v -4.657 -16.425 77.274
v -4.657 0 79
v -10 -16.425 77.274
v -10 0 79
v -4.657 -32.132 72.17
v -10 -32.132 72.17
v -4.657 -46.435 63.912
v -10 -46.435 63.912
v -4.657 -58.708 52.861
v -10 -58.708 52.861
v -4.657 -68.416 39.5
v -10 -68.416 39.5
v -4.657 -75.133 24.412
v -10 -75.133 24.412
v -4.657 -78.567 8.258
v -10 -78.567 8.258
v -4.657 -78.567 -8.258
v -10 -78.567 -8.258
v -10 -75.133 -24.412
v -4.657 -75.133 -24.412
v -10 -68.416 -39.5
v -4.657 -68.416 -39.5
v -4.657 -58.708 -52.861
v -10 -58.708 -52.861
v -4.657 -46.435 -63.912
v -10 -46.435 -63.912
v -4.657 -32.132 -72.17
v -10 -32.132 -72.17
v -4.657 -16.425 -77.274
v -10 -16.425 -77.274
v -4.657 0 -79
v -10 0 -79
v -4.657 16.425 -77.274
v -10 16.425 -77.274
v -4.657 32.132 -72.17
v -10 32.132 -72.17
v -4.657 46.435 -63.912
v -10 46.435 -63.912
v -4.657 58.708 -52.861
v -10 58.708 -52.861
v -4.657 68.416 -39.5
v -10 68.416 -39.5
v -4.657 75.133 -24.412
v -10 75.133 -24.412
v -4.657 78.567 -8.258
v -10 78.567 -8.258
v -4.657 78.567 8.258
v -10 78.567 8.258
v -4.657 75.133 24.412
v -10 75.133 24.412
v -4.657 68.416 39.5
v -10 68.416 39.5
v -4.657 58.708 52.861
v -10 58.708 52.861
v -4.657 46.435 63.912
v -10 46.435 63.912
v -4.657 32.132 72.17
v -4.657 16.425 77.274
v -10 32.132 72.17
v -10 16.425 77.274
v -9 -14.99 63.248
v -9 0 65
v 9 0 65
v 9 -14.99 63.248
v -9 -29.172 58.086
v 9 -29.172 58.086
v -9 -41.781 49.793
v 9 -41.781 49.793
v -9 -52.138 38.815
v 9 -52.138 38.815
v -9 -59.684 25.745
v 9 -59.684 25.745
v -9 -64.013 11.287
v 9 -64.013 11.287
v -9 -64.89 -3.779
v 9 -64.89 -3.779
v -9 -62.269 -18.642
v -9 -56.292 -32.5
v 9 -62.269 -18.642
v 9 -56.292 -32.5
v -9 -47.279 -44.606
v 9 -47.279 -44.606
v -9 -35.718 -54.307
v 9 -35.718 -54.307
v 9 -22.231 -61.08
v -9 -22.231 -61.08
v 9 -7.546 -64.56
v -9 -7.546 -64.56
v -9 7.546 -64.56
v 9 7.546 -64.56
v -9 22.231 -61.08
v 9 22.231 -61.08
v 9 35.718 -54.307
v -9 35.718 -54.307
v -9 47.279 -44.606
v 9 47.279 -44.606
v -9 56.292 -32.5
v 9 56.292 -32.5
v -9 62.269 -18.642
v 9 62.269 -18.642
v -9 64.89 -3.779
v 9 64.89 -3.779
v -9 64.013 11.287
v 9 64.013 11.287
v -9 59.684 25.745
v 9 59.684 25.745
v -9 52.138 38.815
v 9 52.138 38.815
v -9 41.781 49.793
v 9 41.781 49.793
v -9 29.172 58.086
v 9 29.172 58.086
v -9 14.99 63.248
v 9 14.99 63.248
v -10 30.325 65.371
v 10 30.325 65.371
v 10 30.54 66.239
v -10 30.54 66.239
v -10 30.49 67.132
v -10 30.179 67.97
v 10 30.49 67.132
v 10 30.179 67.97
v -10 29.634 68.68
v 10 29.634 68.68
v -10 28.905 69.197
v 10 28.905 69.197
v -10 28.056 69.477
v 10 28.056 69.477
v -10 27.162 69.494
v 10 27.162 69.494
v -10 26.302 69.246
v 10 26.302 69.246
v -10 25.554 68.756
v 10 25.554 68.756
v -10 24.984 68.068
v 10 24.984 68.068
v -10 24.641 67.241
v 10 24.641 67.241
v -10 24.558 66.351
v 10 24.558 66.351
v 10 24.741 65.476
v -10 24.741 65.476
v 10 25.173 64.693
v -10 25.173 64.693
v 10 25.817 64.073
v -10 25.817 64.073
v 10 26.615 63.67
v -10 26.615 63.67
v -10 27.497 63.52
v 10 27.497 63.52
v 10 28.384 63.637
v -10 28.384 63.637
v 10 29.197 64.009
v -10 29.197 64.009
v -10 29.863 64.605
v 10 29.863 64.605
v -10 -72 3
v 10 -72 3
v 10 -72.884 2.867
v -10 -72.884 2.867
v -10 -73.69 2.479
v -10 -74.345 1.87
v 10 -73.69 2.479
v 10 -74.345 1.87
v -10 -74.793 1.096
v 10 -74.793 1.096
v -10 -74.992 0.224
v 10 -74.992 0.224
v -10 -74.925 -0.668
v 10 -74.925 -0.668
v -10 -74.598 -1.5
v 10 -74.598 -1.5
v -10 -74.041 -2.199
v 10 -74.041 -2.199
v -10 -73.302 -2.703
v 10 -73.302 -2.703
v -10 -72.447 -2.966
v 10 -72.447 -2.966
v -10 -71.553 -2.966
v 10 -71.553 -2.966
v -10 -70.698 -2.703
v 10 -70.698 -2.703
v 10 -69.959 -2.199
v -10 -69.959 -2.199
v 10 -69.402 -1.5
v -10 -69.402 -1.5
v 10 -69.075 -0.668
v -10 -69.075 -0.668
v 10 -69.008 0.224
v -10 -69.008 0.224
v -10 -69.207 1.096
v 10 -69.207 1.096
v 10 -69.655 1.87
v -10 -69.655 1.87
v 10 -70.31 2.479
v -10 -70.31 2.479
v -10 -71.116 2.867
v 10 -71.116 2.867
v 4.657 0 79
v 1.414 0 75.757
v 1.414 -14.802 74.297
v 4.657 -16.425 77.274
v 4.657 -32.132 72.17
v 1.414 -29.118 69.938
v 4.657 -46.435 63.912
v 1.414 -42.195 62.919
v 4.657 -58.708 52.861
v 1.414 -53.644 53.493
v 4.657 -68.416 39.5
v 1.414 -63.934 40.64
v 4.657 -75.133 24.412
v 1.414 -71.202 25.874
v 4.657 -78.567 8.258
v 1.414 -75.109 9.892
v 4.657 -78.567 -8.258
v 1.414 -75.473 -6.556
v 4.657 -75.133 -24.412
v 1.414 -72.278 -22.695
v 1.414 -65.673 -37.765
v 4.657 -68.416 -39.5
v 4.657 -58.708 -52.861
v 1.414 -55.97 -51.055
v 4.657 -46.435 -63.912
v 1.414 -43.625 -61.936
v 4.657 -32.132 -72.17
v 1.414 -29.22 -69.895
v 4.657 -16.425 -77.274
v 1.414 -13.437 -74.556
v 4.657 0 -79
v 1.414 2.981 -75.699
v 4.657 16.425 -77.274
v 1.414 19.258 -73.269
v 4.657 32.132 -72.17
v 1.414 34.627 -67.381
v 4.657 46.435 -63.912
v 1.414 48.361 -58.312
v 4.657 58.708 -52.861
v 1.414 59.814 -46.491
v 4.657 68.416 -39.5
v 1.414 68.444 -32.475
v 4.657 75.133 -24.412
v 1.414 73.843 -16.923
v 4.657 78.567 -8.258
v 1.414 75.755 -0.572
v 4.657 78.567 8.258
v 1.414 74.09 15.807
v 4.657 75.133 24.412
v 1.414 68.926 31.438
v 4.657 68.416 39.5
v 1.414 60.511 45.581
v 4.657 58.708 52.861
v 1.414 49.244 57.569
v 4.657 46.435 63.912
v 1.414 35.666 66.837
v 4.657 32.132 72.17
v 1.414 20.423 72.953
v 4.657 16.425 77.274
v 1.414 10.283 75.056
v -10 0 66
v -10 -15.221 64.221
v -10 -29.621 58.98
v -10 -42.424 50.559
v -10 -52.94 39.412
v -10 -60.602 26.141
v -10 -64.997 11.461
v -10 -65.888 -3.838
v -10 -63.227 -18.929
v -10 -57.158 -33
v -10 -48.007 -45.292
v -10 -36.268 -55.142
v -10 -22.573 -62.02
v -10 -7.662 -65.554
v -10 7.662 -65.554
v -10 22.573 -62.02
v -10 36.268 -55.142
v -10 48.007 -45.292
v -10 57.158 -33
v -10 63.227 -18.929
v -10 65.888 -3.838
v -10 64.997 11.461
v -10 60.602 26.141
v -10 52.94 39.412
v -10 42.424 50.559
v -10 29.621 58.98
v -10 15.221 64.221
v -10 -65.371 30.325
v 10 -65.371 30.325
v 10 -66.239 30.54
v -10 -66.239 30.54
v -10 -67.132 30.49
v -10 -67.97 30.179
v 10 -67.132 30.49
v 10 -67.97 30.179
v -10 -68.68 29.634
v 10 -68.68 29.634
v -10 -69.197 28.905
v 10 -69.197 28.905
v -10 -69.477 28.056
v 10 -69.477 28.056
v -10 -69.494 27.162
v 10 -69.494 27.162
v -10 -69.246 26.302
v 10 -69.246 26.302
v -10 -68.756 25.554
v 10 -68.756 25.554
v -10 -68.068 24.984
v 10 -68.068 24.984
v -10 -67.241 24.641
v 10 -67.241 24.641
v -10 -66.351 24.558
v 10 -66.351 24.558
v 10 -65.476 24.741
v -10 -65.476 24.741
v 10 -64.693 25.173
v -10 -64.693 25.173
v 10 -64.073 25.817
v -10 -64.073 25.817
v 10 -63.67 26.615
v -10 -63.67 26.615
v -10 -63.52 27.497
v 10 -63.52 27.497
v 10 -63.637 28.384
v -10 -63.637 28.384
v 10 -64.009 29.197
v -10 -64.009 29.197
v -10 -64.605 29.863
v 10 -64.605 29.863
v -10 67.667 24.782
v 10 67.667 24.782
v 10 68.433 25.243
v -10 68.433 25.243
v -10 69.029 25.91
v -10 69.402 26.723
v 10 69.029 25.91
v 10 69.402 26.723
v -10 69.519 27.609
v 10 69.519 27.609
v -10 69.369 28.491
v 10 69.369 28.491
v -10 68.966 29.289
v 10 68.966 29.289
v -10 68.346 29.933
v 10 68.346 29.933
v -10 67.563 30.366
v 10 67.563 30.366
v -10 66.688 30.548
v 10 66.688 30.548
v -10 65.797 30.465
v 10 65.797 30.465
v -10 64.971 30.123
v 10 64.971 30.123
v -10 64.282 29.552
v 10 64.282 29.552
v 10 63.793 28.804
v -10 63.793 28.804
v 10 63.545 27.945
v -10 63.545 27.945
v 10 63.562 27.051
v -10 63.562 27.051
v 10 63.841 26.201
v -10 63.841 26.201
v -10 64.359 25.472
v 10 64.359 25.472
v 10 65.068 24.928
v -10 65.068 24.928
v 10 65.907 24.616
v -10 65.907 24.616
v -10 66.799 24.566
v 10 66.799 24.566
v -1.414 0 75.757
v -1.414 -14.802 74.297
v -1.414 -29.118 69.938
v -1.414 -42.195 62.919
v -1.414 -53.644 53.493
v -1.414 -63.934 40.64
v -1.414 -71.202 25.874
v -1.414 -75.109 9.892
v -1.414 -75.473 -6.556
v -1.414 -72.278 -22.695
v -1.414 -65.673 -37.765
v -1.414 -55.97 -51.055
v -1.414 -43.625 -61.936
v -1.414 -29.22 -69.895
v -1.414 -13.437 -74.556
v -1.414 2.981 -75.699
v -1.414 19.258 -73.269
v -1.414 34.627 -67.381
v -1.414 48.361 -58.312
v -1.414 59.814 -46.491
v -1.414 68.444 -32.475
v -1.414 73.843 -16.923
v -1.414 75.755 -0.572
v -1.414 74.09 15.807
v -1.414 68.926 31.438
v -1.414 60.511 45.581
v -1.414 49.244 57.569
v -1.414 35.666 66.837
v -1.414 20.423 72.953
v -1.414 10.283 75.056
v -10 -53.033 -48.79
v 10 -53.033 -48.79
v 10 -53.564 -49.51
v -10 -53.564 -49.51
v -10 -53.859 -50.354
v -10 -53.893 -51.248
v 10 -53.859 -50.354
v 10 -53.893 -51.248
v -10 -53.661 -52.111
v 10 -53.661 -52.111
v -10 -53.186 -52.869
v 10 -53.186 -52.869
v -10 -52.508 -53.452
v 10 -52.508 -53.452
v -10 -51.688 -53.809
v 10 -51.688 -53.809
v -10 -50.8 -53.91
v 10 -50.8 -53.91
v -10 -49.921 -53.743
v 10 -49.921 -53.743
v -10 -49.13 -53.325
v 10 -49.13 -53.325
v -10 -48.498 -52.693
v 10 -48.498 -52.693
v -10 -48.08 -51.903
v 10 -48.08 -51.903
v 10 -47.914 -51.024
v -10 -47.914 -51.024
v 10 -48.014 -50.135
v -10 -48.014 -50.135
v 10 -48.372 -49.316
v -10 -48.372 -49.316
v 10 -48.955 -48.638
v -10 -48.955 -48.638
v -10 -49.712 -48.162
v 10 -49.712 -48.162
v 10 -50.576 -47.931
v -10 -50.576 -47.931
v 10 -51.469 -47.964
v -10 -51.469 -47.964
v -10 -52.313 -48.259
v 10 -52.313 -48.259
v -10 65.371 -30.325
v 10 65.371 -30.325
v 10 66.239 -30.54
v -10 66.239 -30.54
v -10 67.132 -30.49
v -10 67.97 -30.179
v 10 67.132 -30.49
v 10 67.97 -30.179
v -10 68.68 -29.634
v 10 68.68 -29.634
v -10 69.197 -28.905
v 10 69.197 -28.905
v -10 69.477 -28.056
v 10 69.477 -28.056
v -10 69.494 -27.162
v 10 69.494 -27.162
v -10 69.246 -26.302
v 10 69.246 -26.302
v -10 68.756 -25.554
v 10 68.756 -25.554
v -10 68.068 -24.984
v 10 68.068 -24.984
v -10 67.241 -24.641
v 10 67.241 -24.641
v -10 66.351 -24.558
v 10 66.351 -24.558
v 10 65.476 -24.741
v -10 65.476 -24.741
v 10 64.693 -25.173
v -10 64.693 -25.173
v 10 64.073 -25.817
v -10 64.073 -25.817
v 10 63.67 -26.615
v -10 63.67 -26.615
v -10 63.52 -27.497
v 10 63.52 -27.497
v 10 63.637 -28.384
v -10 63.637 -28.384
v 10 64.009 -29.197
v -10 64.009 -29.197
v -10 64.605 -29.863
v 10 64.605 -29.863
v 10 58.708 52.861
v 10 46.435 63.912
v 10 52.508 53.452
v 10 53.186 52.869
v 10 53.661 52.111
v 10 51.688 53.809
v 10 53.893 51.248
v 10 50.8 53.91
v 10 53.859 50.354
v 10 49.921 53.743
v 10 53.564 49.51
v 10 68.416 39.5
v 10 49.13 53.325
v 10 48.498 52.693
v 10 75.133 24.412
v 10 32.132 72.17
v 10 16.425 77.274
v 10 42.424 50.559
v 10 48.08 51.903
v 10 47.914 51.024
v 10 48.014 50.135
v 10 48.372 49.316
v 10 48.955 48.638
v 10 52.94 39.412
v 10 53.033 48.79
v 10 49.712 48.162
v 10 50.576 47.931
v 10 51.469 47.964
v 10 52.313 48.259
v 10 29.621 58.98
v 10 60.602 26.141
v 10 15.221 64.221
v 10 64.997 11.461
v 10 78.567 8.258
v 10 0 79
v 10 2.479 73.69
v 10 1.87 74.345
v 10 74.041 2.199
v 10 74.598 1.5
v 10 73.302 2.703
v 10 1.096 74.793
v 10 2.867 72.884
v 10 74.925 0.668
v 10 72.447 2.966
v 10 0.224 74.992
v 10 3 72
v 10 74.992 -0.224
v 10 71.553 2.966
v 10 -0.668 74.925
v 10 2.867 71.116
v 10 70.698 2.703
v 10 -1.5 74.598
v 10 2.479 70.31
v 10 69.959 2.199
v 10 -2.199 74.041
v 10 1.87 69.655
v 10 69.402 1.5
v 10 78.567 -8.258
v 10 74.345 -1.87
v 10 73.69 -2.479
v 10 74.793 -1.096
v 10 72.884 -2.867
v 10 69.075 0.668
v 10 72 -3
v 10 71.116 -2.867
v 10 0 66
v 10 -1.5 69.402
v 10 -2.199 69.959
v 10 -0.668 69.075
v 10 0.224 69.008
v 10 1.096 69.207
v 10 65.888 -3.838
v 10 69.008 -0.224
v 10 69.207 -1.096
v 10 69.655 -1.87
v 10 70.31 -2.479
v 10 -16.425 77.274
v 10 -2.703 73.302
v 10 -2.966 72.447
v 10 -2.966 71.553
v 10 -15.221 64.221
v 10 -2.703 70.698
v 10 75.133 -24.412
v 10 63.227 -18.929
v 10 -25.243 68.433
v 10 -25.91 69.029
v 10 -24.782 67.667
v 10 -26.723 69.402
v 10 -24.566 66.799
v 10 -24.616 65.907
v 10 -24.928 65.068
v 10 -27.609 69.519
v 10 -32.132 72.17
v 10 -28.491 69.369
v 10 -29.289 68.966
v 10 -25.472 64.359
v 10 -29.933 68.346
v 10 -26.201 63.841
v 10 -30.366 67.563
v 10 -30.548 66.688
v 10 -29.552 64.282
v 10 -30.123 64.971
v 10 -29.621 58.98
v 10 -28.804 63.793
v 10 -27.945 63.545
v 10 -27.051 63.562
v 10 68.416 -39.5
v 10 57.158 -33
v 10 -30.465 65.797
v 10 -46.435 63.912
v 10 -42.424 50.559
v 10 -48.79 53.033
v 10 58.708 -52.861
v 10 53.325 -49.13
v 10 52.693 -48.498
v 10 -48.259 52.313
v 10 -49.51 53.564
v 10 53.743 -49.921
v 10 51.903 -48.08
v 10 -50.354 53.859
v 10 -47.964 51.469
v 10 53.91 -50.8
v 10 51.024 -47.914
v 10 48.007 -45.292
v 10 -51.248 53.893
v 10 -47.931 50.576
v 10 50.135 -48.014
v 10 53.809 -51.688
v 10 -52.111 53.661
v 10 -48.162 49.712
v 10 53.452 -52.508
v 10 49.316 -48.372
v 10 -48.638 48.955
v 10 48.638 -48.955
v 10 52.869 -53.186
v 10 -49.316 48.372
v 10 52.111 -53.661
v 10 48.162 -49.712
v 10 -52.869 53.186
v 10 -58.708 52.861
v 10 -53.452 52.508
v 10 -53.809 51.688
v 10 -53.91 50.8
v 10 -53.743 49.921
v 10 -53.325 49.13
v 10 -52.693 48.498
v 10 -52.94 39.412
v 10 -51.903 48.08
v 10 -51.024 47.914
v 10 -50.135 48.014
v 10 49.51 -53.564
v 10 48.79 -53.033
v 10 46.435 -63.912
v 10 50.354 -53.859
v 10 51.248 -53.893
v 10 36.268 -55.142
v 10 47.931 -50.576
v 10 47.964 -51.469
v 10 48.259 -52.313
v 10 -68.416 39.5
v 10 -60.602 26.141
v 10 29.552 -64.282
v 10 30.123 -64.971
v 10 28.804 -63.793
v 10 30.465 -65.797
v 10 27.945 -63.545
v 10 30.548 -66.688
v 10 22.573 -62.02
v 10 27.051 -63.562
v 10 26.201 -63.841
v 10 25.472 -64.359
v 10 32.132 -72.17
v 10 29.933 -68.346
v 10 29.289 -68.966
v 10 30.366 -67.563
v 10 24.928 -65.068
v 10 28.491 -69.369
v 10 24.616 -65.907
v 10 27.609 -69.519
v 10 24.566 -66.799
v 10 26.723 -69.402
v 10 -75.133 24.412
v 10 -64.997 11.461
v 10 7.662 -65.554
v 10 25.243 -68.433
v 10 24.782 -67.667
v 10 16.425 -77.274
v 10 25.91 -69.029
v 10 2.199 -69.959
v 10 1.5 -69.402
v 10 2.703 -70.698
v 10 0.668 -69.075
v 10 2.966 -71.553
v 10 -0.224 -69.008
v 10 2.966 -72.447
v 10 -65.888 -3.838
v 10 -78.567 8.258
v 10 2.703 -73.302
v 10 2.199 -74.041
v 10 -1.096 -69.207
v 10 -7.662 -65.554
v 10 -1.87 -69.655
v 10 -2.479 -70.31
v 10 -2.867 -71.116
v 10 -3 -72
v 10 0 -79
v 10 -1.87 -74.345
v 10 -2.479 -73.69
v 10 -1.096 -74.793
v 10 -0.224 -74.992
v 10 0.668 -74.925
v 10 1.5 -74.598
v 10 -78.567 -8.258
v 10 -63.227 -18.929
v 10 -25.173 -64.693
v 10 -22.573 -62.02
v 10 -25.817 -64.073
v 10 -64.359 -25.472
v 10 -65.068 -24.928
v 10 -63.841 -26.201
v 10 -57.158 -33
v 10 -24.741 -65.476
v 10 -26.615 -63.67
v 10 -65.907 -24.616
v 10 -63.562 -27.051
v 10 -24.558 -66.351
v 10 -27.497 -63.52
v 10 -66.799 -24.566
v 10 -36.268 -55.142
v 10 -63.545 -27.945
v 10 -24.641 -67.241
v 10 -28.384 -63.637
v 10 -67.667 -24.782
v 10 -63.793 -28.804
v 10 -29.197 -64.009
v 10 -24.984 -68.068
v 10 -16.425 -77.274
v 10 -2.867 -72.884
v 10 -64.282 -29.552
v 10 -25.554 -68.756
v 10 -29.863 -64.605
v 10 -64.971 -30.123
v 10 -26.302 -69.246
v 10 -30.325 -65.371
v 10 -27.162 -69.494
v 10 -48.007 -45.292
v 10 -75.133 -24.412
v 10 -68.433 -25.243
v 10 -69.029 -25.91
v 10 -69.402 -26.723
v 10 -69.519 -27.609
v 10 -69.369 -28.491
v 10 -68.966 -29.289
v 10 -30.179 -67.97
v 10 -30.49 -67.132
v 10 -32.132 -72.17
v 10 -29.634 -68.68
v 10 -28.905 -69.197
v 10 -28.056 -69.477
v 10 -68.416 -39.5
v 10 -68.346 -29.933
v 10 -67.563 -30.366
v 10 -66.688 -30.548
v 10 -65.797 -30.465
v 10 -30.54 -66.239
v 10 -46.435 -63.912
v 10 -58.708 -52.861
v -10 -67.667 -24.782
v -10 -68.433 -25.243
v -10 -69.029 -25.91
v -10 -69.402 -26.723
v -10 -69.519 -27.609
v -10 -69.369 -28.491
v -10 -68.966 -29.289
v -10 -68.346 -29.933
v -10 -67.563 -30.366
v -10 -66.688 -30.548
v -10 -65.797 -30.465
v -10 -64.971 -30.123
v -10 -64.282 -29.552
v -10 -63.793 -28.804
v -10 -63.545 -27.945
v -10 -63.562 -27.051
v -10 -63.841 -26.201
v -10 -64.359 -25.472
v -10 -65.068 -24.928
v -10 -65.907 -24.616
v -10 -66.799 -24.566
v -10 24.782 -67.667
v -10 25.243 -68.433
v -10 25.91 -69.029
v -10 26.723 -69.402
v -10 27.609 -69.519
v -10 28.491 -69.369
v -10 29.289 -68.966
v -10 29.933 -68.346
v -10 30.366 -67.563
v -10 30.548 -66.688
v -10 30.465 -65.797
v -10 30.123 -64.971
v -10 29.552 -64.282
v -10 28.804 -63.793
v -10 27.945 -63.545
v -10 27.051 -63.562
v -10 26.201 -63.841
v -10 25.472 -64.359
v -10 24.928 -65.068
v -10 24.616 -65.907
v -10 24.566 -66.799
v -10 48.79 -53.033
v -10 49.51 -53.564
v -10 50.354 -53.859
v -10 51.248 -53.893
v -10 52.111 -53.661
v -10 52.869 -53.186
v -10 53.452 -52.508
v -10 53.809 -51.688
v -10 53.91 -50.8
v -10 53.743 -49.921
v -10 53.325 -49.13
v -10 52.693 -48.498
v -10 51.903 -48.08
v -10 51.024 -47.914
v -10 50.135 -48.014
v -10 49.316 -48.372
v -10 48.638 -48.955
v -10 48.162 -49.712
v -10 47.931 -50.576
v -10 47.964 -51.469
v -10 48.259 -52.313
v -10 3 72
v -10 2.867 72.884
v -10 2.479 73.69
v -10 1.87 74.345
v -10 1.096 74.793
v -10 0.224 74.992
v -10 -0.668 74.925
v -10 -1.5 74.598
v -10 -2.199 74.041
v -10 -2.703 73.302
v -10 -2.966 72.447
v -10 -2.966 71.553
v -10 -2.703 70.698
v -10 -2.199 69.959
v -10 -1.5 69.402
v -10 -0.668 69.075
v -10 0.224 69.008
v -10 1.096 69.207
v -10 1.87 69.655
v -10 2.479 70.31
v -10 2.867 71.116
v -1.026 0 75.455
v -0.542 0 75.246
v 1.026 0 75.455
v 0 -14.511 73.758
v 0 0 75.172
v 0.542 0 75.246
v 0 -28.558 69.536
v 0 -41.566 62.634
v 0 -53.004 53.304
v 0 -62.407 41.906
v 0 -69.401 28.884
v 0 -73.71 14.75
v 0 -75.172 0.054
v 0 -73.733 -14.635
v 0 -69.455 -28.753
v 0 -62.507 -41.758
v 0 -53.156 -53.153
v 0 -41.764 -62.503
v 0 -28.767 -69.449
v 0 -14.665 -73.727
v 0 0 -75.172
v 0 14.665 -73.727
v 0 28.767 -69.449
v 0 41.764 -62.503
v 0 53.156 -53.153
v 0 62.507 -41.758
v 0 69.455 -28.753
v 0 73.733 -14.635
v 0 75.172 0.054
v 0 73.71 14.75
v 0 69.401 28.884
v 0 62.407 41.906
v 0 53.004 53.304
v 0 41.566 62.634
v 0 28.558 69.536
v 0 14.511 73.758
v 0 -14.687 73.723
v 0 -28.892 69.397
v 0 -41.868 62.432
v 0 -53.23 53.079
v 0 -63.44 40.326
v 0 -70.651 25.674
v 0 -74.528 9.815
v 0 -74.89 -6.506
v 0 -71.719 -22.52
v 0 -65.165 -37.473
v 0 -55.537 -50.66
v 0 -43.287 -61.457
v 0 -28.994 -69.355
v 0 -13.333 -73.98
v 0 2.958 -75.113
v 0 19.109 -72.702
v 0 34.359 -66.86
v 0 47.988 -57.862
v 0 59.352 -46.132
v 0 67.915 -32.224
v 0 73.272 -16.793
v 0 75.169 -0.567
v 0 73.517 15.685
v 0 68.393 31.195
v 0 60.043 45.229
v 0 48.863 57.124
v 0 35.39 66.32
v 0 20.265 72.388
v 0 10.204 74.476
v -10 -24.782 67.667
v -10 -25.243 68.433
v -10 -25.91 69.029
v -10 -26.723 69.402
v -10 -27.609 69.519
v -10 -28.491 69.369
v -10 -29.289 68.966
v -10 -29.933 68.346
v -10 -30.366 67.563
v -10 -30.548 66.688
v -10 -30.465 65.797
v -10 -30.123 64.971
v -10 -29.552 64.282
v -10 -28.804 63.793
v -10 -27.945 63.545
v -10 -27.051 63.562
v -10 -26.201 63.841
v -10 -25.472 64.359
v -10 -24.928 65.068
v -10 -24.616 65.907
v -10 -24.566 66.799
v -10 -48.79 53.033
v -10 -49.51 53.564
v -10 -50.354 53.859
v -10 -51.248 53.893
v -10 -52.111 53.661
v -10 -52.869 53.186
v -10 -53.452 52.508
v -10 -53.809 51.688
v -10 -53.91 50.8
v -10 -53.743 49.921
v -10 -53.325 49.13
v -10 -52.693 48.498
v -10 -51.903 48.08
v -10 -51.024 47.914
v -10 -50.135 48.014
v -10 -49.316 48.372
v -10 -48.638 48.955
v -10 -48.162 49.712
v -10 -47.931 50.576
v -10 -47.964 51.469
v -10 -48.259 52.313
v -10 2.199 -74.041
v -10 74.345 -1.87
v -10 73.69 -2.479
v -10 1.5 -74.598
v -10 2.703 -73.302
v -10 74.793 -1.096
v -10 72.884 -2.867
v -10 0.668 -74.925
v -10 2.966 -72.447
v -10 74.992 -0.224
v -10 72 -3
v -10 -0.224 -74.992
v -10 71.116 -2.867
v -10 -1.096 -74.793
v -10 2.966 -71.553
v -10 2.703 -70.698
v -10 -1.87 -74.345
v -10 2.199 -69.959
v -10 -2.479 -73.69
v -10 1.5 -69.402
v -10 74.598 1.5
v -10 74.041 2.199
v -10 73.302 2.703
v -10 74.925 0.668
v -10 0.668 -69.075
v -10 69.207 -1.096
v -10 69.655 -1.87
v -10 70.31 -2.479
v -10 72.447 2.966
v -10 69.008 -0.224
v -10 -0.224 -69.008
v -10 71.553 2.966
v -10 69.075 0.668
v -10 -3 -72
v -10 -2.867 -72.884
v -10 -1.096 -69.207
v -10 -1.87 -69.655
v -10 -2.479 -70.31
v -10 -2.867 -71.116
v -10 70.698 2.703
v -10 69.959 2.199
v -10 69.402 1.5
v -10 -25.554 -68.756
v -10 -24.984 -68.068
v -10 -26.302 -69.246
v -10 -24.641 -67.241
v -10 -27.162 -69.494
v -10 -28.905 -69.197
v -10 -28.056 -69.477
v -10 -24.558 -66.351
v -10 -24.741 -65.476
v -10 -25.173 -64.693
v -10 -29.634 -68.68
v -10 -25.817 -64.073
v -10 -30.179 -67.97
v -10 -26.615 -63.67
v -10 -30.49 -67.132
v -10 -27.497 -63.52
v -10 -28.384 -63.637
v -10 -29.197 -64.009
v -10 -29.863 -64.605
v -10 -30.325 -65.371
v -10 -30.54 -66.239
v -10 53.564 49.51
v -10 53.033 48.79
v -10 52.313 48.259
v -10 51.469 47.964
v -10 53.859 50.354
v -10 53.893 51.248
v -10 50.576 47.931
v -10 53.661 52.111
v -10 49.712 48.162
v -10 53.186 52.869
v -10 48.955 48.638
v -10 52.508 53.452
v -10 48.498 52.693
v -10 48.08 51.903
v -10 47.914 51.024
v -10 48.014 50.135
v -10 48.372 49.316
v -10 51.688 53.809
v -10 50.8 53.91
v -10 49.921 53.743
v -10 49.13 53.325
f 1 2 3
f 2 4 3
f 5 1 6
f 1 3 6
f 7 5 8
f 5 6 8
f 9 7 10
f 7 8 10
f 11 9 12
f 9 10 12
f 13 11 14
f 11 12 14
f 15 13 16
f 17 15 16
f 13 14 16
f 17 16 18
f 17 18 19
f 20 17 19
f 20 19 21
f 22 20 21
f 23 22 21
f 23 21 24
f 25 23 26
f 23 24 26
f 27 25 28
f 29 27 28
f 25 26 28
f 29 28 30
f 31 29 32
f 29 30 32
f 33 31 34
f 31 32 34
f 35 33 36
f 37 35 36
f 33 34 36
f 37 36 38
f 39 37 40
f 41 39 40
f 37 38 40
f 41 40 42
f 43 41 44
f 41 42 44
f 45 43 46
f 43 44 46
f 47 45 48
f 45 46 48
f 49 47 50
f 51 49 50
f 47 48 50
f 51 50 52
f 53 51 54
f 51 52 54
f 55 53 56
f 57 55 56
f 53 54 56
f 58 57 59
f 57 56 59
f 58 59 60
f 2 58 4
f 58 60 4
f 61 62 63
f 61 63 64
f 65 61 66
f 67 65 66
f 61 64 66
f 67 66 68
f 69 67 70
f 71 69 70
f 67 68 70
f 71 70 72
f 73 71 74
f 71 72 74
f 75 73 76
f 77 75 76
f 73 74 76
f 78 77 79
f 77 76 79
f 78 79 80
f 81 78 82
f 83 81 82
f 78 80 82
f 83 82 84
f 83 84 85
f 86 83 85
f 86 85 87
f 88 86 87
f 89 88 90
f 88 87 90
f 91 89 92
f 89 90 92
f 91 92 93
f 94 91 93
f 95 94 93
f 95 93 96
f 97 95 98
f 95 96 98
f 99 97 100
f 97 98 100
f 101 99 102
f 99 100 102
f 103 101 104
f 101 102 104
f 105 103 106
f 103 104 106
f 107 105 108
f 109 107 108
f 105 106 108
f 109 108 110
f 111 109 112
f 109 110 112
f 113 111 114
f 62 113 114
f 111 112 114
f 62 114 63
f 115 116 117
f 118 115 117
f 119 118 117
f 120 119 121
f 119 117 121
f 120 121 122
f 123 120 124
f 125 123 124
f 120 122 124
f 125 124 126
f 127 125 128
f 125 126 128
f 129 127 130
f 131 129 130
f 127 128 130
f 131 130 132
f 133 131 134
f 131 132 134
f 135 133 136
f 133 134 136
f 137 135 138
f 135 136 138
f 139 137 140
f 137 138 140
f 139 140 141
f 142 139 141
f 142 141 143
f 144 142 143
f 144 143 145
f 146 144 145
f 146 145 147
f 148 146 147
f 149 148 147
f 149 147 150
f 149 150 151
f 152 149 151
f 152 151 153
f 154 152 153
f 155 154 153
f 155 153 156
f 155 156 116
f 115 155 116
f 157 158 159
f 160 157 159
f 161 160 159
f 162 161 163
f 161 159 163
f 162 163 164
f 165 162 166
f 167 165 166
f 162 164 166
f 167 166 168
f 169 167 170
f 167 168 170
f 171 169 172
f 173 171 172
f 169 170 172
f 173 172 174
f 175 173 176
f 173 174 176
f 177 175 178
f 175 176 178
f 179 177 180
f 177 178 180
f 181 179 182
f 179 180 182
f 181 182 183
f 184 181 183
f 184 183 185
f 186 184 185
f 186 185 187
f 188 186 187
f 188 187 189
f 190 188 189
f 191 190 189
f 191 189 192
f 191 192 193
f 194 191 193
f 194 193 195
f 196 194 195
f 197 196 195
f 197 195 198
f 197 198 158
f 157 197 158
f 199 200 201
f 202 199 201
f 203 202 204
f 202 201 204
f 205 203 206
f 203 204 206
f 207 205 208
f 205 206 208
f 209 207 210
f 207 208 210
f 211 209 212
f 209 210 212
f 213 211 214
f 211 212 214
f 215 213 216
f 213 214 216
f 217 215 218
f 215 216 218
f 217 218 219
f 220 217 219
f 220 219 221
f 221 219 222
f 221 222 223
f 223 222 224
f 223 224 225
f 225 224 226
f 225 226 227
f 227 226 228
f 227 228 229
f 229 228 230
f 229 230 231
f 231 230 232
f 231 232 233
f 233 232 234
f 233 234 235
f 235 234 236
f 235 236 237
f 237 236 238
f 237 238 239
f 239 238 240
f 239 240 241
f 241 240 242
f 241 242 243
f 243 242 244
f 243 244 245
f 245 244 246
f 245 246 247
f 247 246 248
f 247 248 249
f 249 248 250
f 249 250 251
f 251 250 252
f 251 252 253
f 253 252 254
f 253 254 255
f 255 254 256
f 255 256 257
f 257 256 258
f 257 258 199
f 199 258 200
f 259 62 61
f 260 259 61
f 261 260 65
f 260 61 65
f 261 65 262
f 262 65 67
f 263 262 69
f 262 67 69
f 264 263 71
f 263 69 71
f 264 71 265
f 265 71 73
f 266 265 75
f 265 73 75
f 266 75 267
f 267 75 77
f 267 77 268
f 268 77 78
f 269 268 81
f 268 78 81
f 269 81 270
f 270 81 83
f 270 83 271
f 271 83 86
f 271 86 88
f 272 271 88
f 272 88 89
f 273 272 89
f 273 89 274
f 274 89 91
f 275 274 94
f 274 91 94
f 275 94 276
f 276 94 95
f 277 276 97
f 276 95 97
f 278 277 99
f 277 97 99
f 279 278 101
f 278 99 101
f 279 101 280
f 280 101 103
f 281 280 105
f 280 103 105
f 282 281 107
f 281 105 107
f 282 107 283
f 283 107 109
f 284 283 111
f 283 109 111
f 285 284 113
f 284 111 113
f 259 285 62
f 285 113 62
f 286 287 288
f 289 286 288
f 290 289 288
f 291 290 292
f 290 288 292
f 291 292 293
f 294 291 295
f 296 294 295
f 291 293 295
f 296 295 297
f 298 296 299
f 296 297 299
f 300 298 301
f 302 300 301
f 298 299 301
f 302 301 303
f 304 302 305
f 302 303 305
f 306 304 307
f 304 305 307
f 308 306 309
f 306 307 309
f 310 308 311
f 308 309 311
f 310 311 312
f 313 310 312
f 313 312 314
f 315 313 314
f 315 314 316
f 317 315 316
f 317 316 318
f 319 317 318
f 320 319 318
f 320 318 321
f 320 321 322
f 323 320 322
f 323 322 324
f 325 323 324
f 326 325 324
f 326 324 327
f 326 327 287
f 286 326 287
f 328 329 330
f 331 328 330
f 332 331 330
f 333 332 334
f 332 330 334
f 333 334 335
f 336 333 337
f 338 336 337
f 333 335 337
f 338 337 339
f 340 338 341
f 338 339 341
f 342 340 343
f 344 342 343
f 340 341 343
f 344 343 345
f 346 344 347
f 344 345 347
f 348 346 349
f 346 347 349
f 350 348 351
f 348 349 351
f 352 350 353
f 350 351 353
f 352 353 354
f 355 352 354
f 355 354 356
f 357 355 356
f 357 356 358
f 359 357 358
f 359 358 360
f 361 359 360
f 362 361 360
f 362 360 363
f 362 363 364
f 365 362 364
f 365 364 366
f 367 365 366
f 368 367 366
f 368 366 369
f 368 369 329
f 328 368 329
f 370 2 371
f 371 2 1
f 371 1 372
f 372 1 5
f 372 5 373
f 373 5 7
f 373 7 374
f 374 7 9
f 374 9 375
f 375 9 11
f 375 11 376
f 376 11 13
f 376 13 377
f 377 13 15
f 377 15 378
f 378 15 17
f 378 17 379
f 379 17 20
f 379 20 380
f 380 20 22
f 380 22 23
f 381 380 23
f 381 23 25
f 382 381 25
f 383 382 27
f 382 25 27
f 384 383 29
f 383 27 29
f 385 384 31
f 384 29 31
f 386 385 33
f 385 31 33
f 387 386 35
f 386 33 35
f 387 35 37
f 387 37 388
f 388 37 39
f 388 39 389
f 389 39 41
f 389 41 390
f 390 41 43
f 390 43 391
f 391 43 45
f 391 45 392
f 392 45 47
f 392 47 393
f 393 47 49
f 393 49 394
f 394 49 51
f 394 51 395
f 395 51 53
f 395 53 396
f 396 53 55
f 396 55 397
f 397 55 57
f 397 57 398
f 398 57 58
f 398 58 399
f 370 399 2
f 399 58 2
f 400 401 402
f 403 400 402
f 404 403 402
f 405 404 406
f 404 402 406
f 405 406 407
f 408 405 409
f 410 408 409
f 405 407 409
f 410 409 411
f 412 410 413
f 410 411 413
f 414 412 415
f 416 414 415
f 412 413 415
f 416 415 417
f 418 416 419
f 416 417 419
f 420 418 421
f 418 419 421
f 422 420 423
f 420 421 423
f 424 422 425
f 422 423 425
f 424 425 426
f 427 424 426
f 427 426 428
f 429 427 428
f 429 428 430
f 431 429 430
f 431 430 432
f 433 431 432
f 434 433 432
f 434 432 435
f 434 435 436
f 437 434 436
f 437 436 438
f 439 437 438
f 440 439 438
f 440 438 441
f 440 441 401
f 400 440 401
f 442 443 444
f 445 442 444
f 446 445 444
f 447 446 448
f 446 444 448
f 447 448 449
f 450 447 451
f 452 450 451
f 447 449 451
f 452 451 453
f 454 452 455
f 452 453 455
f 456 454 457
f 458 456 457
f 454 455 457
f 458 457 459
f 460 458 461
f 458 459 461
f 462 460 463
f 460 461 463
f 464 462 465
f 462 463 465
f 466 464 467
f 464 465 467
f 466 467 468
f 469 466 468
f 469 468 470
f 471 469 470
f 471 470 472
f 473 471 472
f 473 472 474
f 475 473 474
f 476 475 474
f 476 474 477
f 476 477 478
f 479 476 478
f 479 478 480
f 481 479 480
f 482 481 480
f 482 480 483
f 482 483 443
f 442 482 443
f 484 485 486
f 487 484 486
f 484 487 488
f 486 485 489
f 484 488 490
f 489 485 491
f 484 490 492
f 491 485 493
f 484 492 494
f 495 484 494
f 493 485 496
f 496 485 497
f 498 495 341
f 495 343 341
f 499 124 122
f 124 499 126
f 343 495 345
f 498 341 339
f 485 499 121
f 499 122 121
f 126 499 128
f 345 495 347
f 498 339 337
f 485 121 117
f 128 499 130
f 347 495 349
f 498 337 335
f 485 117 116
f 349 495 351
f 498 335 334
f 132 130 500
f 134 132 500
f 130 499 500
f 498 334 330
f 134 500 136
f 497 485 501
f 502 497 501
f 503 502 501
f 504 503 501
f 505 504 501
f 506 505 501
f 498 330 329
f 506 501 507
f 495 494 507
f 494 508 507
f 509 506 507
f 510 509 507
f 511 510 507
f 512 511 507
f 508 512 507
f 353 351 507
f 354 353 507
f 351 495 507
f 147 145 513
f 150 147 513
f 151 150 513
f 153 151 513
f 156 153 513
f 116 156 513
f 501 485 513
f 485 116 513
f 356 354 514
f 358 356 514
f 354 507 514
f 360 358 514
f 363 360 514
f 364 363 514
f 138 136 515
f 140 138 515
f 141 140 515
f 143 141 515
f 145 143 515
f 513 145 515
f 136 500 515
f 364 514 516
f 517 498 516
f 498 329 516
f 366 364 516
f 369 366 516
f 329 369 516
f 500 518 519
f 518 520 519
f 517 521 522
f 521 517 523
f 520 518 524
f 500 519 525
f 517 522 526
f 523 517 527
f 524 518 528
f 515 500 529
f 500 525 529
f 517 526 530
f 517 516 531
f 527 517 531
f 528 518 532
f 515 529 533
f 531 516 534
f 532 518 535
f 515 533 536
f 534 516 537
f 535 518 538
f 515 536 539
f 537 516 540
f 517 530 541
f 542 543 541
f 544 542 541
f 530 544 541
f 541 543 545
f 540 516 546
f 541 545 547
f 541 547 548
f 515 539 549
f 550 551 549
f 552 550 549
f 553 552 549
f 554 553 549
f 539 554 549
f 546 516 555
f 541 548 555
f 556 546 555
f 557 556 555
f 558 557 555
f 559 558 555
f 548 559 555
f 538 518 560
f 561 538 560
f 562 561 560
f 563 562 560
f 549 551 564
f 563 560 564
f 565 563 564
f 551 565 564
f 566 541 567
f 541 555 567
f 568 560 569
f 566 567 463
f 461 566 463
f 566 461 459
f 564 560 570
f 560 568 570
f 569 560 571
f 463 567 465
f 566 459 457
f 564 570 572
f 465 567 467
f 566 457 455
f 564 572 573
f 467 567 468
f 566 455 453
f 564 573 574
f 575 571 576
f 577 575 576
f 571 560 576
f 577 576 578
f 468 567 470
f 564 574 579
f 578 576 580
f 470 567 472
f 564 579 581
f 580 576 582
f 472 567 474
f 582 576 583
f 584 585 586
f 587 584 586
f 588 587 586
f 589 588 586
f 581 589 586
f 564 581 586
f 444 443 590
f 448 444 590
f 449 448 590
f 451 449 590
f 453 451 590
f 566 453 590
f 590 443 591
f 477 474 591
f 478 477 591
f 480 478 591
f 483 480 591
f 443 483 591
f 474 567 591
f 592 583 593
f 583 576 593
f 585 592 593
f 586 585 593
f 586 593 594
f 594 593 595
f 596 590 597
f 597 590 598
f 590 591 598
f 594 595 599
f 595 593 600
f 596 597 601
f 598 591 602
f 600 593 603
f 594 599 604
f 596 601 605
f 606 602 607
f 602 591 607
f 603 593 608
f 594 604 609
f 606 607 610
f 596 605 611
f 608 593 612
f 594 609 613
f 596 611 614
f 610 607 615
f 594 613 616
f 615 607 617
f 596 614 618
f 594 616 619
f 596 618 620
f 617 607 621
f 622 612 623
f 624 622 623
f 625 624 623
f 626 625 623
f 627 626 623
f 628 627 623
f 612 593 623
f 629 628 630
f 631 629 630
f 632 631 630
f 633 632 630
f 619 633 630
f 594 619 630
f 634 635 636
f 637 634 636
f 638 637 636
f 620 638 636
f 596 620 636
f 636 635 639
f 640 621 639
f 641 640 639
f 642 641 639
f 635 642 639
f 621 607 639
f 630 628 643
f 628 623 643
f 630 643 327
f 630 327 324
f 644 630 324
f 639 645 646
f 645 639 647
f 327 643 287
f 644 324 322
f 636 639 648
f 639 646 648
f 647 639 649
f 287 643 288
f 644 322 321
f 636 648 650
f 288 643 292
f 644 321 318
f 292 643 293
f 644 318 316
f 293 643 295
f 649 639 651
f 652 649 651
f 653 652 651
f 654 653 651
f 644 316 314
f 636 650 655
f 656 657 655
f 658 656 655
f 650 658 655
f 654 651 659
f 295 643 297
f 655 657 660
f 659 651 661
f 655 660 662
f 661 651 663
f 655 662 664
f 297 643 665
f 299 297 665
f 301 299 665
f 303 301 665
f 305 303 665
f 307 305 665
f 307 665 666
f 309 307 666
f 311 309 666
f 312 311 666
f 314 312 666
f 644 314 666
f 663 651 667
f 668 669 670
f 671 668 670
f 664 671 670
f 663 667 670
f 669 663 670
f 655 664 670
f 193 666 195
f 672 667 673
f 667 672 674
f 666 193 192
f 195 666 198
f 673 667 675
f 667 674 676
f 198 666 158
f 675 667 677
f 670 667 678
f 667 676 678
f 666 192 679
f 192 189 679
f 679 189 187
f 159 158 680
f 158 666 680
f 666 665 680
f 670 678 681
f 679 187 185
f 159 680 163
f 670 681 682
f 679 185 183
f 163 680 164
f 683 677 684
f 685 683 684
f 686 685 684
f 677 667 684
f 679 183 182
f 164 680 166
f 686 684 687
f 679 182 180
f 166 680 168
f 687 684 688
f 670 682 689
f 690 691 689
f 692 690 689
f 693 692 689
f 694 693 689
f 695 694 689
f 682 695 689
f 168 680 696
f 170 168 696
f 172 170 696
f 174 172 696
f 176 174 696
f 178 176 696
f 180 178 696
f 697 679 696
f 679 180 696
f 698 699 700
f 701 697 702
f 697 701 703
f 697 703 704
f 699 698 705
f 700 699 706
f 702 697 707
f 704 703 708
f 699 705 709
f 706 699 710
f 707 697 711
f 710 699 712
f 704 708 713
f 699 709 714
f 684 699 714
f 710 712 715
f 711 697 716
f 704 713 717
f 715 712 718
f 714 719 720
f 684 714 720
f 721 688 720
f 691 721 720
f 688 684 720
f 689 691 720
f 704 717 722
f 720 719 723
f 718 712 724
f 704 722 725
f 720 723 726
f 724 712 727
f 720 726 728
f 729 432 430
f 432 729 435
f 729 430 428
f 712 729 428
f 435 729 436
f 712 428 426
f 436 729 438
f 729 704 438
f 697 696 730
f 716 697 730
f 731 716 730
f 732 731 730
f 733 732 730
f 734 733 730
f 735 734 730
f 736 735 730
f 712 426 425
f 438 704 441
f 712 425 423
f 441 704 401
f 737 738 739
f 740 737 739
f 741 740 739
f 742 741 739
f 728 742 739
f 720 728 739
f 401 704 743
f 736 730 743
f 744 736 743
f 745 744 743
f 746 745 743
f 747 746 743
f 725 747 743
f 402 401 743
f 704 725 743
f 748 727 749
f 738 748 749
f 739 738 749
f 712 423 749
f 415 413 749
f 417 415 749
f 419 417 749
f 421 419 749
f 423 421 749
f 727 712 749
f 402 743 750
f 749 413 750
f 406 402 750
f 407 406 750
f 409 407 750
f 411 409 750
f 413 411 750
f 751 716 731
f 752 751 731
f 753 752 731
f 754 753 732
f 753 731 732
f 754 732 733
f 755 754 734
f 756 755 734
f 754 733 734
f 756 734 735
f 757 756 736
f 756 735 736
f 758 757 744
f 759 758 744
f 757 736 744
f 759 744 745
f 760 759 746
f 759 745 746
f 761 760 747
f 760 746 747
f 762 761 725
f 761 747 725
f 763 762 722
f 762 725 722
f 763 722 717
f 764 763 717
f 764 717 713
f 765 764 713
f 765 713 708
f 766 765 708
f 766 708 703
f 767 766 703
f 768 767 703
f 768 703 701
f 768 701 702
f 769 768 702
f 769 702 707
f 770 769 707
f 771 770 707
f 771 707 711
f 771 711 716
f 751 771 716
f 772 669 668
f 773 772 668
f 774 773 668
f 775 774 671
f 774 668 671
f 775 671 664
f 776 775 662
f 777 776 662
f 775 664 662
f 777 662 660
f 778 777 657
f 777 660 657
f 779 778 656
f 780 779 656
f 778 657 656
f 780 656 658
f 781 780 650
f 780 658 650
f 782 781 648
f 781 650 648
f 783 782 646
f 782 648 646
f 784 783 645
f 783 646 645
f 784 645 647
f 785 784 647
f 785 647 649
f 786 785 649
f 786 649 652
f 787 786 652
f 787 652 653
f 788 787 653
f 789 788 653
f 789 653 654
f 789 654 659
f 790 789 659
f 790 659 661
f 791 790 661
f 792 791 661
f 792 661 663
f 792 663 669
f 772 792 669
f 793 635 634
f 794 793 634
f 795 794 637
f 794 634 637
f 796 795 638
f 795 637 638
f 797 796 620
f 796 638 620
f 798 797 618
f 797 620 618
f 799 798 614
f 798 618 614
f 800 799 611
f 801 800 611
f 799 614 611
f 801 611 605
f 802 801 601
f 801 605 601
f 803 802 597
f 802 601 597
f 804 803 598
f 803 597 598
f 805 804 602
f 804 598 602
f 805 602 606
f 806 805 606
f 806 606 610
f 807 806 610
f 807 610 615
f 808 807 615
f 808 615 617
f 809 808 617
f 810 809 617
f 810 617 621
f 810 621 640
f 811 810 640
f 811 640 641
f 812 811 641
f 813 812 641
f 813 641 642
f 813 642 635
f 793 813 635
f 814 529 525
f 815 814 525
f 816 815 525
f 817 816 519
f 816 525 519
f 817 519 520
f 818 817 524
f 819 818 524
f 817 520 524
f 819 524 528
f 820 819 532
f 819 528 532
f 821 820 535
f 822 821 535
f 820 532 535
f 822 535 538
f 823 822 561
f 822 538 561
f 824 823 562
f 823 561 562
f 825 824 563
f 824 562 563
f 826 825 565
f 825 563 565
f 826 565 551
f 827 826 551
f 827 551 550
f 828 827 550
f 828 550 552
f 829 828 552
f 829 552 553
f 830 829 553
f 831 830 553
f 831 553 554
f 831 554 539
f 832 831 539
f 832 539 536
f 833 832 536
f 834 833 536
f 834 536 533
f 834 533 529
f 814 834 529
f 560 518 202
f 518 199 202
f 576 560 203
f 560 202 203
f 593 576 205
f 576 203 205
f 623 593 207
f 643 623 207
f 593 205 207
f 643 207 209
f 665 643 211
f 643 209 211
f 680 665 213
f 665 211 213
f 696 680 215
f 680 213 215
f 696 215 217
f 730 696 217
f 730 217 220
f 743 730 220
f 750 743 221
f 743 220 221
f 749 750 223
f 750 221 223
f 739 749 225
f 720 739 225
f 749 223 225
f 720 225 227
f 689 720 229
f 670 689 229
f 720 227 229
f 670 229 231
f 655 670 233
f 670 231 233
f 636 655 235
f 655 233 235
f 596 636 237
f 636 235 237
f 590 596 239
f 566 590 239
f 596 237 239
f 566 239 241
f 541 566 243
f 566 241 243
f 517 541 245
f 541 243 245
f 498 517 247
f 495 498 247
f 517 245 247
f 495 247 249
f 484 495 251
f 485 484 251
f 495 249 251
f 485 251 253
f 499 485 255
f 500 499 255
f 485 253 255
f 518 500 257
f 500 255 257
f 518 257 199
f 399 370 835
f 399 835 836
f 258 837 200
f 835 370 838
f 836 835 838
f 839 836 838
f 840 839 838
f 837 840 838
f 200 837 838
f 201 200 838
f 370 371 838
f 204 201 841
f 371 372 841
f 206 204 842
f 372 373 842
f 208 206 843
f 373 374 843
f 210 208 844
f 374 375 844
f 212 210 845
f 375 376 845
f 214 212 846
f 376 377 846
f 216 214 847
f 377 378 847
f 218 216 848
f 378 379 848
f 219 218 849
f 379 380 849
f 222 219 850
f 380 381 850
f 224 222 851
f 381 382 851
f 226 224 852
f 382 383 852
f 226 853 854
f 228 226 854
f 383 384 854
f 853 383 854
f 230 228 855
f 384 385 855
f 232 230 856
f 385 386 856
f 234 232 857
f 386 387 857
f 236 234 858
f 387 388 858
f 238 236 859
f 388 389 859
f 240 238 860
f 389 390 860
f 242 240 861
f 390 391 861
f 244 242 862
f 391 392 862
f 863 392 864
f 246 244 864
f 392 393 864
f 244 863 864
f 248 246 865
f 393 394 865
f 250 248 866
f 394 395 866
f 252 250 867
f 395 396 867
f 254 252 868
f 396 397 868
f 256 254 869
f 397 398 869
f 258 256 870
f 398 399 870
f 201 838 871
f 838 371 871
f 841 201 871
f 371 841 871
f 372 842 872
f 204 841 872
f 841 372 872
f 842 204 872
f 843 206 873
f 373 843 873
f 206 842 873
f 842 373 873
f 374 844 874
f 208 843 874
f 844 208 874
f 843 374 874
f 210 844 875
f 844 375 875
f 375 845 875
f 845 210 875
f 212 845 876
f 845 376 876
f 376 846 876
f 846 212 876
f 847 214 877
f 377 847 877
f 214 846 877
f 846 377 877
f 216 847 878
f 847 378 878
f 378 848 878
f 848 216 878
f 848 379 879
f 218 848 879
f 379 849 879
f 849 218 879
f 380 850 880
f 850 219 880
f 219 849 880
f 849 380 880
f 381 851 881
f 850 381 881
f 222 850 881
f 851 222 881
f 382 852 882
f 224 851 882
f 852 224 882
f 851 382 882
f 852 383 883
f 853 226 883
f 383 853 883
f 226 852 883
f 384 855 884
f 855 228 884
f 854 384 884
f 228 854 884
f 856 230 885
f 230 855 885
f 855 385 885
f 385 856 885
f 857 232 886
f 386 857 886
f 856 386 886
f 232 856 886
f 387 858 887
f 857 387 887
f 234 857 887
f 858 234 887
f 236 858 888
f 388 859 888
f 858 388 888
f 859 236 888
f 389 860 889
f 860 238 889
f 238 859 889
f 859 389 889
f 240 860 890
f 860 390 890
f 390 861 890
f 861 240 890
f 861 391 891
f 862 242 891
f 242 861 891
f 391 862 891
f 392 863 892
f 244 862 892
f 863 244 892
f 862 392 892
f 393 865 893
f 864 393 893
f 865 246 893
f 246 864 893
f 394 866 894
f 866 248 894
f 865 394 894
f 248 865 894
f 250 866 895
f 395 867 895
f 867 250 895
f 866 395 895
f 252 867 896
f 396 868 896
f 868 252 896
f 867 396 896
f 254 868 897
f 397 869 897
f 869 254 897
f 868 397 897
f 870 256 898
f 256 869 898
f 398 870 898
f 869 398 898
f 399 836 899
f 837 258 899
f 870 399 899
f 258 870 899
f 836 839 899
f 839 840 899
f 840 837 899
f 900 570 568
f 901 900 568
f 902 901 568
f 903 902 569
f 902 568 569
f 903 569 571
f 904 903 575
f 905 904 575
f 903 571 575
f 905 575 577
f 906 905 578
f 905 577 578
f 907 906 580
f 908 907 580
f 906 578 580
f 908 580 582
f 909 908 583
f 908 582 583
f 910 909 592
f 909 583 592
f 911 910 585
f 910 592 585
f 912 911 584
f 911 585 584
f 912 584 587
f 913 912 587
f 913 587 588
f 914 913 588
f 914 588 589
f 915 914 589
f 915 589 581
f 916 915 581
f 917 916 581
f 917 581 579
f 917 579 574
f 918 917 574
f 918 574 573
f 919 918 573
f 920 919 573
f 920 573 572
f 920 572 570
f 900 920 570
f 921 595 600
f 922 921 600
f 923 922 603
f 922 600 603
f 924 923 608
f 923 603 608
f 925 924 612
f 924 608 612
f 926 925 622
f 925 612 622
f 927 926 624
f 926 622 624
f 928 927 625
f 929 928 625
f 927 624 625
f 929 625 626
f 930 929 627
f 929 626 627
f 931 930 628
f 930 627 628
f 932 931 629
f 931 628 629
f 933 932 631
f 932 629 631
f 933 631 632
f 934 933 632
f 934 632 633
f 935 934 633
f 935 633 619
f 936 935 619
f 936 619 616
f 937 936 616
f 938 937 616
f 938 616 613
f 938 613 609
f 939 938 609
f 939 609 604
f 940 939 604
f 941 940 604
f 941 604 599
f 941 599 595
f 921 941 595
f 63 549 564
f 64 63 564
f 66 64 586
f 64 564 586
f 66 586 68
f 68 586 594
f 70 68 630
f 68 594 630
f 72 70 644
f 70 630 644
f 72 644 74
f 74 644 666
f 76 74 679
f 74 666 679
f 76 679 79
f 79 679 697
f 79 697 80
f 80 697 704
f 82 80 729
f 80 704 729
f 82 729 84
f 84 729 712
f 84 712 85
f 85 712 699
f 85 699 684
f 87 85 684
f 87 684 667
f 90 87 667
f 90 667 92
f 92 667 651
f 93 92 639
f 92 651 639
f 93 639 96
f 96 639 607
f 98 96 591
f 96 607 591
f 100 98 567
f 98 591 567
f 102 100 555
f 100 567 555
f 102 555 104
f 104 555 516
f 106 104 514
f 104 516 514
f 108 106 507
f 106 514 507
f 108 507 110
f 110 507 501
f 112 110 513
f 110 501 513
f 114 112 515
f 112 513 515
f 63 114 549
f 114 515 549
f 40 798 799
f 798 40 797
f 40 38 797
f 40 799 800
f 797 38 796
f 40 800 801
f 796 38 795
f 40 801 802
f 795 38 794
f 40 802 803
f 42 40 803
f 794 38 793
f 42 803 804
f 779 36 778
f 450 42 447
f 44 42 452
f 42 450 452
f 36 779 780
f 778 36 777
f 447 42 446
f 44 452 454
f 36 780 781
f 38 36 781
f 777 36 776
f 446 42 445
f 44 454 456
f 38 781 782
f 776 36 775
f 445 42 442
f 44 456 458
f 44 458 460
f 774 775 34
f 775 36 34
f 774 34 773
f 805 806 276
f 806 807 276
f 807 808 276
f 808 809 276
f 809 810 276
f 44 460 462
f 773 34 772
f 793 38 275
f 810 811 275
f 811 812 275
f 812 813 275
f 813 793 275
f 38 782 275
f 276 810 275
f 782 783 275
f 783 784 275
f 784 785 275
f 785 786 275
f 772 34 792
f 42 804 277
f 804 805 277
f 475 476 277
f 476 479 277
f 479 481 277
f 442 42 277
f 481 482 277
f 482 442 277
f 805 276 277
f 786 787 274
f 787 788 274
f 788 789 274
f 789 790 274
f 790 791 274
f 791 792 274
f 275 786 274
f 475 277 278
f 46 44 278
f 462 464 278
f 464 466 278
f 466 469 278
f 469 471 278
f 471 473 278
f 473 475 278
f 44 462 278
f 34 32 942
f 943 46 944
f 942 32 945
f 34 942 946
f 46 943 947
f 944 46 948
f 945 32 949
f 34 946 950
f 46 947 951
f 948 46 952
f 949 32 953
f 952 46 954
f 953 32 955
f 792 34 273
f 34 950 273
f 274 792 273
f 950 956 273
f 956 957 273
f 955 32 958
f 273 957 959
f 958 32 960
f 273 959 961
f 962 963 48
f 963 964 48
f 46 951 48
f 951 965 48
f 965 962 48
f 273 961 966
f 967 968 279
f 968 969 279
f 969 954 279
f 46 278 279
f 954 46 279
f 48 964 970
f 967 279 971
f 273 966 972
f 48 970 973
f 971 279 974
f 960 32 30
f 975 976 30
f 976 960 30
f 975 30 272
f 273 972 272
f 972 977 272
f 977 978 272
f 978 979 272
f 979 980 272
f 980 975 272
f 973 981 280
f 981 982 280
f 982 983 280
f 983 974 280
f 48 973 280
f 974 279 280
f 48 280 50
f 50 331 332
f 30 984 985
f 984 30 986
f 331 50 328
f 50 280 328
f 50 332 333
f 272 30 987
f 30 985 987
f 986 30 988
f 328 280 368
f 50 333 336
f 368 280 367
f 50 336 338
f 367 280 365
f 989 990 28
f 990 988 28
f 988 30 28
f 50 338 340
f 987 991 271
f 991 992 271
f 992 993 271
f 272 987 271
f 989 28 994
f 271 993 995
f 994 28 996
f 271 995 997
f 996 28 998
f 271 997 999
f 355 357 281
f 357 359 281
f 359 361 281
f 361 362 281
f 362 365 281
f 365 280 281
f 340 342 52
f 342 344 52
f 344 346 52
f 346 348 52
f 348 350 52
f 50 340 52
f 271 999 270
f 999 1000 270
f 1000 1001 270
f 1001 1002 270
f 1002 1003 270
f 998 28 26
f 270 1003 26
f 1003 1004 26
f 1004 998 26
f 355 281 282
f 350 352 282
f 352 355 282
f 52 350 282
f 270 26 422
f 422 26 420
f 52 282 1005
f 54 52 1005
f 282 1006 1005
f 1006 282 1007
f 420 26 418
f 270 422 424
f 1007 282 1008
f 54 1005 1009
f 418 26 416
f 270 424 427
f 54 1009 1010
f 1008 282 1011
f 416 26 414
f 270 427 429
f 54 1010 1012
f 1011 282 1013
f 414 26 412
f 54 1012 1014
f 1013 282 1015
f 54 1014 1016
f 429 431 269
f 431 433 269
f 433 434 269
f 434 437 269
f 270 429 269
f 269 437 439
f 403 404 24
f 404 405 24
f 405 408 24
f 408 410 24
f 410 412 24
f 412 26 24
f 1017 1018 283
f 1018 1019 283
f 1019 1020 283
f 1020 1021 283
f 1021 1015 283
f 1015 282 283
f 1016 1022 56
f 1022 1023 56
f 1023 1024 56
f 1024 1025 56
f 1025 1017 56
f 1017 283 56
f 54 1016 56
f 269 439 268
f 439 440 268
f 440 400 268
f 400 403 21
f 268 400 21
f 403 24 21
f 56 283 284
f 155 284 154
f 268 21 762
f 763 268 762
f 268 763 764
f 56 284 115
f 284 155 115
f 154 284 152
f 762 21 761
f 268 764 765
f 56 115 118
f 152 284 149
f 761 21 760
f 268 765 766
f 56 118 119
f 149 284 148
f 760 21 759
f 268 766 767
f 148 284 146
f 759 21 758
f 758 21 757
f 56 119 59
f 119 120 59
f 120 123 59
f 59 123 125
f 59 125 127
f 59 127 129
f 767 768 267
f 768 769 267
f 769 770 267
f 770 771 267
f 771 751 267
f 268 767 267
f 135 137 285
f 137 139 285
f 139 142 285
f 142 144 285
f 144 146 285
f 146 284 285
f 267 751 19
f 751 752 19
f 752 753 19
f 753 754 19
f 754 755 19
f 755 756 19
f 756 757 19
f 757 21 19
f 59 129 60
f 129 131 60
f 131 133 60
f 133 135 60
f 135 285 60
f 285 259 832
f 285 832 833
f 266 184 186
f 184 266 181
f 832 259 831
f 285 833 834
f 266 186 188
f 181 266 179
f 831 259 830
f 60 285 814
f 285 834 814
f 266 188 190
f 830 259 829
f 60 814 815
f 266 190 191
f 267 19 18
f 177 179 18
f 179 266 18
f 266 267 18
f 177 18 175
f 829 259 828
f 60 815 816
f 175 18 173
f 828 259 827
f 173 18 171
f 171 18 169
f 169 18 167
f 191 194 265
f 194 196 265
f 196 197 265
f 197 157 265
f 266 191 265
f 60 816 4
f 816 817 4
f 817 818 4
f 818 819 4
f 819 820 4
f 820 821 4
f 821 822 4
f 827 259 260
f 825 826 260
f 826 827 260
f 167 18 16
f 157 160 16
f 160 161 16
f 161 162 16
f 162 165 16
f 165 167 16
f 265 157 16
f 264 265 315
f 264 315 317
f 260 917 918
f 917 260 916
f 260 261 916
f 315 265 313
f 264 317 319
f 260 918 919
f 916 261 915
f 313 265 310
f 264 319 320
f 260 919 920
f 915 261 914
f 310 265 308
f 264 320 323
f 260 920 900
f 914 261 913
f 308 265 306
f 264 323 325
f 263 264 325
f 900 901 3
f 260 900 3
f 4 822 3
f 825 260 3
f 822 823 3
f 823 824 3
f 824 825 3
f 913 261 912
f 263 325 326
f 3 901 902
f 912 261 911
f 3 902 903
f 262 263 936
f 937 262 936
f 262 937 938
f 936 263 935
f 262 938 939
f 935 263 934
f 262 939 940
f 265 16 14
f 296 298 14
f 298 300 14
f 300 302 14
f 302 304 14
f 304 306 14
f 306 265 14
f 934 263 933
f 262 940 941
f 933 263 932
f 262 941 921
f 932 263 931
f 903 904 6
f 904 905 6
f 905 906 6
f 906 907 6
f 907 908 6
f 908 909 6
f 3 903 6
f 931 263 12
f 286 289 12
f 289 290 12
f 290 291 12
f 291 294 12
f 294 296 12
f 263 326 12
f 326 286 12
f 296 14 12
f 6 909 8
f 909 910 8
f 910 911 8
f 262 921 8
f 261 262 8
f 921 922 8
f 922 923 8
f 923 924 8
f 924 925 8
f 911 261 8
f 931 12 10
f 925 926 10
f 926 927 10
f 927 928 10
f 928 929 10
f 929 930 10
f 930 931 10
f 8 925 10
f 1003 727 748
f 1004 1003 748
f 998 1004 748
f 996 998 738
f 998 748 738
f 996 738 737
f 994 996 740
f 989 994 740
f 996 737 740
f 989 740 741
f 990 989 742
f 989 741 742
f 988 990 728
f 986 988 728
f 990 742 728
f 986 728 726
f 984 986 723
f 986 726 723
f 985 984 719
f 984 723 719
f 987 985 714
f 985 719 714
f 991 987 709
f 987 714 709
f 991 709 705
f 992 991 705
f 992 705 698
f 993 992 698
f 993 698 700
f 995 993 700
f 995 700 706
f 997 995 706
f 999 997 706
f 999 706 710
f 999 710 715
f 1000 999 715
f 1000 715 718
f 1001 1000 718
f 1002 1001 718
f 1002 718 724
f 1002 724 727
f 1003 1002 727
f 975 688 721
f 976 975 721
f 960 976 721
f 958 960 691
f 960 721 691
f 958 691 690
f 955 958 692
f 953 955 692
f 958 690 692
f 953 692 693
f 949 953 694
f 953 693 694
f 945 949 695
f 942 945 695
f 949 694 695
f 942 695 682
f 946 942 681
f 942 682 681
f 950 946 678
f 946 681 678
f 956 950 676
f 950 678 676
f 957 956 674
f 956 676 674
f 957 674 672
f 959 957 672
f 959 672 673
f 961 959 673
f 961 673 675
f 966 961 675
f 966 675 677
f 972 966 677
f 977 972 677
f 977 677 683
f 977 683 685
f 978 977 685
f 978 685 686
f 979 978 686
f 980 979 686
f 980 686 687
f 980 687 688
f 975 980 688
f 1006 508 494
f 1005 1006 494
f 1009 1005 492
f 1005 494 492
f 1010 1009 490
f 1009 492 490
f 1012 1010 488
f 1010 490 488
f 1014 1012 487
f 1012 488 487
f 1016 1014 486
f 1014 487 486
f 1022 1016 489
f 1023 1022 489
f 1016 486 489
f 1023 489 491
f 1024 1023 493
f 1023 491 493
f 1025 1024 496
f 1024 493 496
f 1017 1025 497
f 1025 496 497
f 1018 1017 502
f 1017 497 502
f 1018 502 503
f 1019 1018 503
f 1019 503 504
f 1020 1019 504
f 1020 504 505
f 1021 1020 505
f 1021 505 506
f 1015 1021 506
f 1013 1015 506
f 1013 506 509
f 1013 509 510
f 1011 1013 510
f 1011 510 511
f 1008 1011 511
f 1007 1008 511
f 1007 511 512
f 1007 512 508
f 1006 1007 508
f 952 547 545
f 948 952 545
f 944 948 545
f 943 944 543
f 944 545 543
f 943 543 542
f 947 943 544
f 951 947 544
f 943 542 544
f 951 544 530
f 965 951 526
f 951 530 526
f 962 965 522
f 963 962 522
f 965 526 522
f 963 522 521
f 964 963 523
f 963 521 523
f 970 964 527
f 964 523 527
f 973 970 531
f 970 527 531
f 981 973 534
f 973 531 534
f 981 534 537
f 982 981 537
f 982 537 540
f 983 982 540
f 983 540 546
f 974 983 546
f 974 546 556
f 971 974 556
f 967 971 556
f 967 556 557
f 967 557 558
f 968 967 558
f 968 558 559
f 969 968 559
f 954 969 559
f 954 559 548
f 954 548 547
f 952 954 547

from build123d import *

# Parameters (mm, degrees)
CHAMFER1_SIZE      = 1
FILLET1_R          = 2
SKETCH2_R          = 3
CUT_EXTRUDE1_DEPTH = 114.498898812
CIRPATTERN1_COUNT  = 16


with BuildPart() as part:
    # Sketch1 → Revolve1 (revolve)
    with BuildSketch(Plane.XY):
        Polygon((10, 79), (4.656854249, 79), (0, 74.343145751), (-4.656854249, 79), (-10, 79), (-10, 65), (10, 65), align=None)
    revolve(axis=Axis((-42.067307692, 0, 0), (1, 0, 0)))

    # Chamfer1
    chamfer1_edges = [part.edges().sort_by_distance(p)[0] for p in [
        (10, -65, 0),
        (-10, -65, 0),
    ]]
    chamfer(chamfer1_edges, length=CHAMFER1_SIZE)

    # Fillet1
    fillet1_edges = [part.edges().sort_by_distance(p)[0] for p in [
        (0, -74.343145751, 0),
    ]]
    fillet(fillet1_edges, radius=FILLET1_R)

    # Sketch2 → Cut-Extrude1 (cut, through all)
    with BuildSketch(Plane(origin=(10, 0, 0), x_dir=(0, 0, -1), z_dir=(1, 0, 0))):
        with Locations((0, 72)):
            Circle(SKETCH2_R)
    cut_extrude1 = extrude(amount=-CUT_EXTRUDE1_DEPTH, mode=Mode.SUBTRACT)

    # CirPattern1: Cut-Extrude1 ×16 about axis
    cirpattern1_axis = Axis((10, 0, 0), (-1, 0, 0))
    for i in range(1, CIRPATTERN1_COUNT):
        add(cut_extrude1.rotate(cirpattern1_axis, i * 360 / CIRPATTERN1_COUNT), mode=Mode.SUBTRACT)


solid = part.part
